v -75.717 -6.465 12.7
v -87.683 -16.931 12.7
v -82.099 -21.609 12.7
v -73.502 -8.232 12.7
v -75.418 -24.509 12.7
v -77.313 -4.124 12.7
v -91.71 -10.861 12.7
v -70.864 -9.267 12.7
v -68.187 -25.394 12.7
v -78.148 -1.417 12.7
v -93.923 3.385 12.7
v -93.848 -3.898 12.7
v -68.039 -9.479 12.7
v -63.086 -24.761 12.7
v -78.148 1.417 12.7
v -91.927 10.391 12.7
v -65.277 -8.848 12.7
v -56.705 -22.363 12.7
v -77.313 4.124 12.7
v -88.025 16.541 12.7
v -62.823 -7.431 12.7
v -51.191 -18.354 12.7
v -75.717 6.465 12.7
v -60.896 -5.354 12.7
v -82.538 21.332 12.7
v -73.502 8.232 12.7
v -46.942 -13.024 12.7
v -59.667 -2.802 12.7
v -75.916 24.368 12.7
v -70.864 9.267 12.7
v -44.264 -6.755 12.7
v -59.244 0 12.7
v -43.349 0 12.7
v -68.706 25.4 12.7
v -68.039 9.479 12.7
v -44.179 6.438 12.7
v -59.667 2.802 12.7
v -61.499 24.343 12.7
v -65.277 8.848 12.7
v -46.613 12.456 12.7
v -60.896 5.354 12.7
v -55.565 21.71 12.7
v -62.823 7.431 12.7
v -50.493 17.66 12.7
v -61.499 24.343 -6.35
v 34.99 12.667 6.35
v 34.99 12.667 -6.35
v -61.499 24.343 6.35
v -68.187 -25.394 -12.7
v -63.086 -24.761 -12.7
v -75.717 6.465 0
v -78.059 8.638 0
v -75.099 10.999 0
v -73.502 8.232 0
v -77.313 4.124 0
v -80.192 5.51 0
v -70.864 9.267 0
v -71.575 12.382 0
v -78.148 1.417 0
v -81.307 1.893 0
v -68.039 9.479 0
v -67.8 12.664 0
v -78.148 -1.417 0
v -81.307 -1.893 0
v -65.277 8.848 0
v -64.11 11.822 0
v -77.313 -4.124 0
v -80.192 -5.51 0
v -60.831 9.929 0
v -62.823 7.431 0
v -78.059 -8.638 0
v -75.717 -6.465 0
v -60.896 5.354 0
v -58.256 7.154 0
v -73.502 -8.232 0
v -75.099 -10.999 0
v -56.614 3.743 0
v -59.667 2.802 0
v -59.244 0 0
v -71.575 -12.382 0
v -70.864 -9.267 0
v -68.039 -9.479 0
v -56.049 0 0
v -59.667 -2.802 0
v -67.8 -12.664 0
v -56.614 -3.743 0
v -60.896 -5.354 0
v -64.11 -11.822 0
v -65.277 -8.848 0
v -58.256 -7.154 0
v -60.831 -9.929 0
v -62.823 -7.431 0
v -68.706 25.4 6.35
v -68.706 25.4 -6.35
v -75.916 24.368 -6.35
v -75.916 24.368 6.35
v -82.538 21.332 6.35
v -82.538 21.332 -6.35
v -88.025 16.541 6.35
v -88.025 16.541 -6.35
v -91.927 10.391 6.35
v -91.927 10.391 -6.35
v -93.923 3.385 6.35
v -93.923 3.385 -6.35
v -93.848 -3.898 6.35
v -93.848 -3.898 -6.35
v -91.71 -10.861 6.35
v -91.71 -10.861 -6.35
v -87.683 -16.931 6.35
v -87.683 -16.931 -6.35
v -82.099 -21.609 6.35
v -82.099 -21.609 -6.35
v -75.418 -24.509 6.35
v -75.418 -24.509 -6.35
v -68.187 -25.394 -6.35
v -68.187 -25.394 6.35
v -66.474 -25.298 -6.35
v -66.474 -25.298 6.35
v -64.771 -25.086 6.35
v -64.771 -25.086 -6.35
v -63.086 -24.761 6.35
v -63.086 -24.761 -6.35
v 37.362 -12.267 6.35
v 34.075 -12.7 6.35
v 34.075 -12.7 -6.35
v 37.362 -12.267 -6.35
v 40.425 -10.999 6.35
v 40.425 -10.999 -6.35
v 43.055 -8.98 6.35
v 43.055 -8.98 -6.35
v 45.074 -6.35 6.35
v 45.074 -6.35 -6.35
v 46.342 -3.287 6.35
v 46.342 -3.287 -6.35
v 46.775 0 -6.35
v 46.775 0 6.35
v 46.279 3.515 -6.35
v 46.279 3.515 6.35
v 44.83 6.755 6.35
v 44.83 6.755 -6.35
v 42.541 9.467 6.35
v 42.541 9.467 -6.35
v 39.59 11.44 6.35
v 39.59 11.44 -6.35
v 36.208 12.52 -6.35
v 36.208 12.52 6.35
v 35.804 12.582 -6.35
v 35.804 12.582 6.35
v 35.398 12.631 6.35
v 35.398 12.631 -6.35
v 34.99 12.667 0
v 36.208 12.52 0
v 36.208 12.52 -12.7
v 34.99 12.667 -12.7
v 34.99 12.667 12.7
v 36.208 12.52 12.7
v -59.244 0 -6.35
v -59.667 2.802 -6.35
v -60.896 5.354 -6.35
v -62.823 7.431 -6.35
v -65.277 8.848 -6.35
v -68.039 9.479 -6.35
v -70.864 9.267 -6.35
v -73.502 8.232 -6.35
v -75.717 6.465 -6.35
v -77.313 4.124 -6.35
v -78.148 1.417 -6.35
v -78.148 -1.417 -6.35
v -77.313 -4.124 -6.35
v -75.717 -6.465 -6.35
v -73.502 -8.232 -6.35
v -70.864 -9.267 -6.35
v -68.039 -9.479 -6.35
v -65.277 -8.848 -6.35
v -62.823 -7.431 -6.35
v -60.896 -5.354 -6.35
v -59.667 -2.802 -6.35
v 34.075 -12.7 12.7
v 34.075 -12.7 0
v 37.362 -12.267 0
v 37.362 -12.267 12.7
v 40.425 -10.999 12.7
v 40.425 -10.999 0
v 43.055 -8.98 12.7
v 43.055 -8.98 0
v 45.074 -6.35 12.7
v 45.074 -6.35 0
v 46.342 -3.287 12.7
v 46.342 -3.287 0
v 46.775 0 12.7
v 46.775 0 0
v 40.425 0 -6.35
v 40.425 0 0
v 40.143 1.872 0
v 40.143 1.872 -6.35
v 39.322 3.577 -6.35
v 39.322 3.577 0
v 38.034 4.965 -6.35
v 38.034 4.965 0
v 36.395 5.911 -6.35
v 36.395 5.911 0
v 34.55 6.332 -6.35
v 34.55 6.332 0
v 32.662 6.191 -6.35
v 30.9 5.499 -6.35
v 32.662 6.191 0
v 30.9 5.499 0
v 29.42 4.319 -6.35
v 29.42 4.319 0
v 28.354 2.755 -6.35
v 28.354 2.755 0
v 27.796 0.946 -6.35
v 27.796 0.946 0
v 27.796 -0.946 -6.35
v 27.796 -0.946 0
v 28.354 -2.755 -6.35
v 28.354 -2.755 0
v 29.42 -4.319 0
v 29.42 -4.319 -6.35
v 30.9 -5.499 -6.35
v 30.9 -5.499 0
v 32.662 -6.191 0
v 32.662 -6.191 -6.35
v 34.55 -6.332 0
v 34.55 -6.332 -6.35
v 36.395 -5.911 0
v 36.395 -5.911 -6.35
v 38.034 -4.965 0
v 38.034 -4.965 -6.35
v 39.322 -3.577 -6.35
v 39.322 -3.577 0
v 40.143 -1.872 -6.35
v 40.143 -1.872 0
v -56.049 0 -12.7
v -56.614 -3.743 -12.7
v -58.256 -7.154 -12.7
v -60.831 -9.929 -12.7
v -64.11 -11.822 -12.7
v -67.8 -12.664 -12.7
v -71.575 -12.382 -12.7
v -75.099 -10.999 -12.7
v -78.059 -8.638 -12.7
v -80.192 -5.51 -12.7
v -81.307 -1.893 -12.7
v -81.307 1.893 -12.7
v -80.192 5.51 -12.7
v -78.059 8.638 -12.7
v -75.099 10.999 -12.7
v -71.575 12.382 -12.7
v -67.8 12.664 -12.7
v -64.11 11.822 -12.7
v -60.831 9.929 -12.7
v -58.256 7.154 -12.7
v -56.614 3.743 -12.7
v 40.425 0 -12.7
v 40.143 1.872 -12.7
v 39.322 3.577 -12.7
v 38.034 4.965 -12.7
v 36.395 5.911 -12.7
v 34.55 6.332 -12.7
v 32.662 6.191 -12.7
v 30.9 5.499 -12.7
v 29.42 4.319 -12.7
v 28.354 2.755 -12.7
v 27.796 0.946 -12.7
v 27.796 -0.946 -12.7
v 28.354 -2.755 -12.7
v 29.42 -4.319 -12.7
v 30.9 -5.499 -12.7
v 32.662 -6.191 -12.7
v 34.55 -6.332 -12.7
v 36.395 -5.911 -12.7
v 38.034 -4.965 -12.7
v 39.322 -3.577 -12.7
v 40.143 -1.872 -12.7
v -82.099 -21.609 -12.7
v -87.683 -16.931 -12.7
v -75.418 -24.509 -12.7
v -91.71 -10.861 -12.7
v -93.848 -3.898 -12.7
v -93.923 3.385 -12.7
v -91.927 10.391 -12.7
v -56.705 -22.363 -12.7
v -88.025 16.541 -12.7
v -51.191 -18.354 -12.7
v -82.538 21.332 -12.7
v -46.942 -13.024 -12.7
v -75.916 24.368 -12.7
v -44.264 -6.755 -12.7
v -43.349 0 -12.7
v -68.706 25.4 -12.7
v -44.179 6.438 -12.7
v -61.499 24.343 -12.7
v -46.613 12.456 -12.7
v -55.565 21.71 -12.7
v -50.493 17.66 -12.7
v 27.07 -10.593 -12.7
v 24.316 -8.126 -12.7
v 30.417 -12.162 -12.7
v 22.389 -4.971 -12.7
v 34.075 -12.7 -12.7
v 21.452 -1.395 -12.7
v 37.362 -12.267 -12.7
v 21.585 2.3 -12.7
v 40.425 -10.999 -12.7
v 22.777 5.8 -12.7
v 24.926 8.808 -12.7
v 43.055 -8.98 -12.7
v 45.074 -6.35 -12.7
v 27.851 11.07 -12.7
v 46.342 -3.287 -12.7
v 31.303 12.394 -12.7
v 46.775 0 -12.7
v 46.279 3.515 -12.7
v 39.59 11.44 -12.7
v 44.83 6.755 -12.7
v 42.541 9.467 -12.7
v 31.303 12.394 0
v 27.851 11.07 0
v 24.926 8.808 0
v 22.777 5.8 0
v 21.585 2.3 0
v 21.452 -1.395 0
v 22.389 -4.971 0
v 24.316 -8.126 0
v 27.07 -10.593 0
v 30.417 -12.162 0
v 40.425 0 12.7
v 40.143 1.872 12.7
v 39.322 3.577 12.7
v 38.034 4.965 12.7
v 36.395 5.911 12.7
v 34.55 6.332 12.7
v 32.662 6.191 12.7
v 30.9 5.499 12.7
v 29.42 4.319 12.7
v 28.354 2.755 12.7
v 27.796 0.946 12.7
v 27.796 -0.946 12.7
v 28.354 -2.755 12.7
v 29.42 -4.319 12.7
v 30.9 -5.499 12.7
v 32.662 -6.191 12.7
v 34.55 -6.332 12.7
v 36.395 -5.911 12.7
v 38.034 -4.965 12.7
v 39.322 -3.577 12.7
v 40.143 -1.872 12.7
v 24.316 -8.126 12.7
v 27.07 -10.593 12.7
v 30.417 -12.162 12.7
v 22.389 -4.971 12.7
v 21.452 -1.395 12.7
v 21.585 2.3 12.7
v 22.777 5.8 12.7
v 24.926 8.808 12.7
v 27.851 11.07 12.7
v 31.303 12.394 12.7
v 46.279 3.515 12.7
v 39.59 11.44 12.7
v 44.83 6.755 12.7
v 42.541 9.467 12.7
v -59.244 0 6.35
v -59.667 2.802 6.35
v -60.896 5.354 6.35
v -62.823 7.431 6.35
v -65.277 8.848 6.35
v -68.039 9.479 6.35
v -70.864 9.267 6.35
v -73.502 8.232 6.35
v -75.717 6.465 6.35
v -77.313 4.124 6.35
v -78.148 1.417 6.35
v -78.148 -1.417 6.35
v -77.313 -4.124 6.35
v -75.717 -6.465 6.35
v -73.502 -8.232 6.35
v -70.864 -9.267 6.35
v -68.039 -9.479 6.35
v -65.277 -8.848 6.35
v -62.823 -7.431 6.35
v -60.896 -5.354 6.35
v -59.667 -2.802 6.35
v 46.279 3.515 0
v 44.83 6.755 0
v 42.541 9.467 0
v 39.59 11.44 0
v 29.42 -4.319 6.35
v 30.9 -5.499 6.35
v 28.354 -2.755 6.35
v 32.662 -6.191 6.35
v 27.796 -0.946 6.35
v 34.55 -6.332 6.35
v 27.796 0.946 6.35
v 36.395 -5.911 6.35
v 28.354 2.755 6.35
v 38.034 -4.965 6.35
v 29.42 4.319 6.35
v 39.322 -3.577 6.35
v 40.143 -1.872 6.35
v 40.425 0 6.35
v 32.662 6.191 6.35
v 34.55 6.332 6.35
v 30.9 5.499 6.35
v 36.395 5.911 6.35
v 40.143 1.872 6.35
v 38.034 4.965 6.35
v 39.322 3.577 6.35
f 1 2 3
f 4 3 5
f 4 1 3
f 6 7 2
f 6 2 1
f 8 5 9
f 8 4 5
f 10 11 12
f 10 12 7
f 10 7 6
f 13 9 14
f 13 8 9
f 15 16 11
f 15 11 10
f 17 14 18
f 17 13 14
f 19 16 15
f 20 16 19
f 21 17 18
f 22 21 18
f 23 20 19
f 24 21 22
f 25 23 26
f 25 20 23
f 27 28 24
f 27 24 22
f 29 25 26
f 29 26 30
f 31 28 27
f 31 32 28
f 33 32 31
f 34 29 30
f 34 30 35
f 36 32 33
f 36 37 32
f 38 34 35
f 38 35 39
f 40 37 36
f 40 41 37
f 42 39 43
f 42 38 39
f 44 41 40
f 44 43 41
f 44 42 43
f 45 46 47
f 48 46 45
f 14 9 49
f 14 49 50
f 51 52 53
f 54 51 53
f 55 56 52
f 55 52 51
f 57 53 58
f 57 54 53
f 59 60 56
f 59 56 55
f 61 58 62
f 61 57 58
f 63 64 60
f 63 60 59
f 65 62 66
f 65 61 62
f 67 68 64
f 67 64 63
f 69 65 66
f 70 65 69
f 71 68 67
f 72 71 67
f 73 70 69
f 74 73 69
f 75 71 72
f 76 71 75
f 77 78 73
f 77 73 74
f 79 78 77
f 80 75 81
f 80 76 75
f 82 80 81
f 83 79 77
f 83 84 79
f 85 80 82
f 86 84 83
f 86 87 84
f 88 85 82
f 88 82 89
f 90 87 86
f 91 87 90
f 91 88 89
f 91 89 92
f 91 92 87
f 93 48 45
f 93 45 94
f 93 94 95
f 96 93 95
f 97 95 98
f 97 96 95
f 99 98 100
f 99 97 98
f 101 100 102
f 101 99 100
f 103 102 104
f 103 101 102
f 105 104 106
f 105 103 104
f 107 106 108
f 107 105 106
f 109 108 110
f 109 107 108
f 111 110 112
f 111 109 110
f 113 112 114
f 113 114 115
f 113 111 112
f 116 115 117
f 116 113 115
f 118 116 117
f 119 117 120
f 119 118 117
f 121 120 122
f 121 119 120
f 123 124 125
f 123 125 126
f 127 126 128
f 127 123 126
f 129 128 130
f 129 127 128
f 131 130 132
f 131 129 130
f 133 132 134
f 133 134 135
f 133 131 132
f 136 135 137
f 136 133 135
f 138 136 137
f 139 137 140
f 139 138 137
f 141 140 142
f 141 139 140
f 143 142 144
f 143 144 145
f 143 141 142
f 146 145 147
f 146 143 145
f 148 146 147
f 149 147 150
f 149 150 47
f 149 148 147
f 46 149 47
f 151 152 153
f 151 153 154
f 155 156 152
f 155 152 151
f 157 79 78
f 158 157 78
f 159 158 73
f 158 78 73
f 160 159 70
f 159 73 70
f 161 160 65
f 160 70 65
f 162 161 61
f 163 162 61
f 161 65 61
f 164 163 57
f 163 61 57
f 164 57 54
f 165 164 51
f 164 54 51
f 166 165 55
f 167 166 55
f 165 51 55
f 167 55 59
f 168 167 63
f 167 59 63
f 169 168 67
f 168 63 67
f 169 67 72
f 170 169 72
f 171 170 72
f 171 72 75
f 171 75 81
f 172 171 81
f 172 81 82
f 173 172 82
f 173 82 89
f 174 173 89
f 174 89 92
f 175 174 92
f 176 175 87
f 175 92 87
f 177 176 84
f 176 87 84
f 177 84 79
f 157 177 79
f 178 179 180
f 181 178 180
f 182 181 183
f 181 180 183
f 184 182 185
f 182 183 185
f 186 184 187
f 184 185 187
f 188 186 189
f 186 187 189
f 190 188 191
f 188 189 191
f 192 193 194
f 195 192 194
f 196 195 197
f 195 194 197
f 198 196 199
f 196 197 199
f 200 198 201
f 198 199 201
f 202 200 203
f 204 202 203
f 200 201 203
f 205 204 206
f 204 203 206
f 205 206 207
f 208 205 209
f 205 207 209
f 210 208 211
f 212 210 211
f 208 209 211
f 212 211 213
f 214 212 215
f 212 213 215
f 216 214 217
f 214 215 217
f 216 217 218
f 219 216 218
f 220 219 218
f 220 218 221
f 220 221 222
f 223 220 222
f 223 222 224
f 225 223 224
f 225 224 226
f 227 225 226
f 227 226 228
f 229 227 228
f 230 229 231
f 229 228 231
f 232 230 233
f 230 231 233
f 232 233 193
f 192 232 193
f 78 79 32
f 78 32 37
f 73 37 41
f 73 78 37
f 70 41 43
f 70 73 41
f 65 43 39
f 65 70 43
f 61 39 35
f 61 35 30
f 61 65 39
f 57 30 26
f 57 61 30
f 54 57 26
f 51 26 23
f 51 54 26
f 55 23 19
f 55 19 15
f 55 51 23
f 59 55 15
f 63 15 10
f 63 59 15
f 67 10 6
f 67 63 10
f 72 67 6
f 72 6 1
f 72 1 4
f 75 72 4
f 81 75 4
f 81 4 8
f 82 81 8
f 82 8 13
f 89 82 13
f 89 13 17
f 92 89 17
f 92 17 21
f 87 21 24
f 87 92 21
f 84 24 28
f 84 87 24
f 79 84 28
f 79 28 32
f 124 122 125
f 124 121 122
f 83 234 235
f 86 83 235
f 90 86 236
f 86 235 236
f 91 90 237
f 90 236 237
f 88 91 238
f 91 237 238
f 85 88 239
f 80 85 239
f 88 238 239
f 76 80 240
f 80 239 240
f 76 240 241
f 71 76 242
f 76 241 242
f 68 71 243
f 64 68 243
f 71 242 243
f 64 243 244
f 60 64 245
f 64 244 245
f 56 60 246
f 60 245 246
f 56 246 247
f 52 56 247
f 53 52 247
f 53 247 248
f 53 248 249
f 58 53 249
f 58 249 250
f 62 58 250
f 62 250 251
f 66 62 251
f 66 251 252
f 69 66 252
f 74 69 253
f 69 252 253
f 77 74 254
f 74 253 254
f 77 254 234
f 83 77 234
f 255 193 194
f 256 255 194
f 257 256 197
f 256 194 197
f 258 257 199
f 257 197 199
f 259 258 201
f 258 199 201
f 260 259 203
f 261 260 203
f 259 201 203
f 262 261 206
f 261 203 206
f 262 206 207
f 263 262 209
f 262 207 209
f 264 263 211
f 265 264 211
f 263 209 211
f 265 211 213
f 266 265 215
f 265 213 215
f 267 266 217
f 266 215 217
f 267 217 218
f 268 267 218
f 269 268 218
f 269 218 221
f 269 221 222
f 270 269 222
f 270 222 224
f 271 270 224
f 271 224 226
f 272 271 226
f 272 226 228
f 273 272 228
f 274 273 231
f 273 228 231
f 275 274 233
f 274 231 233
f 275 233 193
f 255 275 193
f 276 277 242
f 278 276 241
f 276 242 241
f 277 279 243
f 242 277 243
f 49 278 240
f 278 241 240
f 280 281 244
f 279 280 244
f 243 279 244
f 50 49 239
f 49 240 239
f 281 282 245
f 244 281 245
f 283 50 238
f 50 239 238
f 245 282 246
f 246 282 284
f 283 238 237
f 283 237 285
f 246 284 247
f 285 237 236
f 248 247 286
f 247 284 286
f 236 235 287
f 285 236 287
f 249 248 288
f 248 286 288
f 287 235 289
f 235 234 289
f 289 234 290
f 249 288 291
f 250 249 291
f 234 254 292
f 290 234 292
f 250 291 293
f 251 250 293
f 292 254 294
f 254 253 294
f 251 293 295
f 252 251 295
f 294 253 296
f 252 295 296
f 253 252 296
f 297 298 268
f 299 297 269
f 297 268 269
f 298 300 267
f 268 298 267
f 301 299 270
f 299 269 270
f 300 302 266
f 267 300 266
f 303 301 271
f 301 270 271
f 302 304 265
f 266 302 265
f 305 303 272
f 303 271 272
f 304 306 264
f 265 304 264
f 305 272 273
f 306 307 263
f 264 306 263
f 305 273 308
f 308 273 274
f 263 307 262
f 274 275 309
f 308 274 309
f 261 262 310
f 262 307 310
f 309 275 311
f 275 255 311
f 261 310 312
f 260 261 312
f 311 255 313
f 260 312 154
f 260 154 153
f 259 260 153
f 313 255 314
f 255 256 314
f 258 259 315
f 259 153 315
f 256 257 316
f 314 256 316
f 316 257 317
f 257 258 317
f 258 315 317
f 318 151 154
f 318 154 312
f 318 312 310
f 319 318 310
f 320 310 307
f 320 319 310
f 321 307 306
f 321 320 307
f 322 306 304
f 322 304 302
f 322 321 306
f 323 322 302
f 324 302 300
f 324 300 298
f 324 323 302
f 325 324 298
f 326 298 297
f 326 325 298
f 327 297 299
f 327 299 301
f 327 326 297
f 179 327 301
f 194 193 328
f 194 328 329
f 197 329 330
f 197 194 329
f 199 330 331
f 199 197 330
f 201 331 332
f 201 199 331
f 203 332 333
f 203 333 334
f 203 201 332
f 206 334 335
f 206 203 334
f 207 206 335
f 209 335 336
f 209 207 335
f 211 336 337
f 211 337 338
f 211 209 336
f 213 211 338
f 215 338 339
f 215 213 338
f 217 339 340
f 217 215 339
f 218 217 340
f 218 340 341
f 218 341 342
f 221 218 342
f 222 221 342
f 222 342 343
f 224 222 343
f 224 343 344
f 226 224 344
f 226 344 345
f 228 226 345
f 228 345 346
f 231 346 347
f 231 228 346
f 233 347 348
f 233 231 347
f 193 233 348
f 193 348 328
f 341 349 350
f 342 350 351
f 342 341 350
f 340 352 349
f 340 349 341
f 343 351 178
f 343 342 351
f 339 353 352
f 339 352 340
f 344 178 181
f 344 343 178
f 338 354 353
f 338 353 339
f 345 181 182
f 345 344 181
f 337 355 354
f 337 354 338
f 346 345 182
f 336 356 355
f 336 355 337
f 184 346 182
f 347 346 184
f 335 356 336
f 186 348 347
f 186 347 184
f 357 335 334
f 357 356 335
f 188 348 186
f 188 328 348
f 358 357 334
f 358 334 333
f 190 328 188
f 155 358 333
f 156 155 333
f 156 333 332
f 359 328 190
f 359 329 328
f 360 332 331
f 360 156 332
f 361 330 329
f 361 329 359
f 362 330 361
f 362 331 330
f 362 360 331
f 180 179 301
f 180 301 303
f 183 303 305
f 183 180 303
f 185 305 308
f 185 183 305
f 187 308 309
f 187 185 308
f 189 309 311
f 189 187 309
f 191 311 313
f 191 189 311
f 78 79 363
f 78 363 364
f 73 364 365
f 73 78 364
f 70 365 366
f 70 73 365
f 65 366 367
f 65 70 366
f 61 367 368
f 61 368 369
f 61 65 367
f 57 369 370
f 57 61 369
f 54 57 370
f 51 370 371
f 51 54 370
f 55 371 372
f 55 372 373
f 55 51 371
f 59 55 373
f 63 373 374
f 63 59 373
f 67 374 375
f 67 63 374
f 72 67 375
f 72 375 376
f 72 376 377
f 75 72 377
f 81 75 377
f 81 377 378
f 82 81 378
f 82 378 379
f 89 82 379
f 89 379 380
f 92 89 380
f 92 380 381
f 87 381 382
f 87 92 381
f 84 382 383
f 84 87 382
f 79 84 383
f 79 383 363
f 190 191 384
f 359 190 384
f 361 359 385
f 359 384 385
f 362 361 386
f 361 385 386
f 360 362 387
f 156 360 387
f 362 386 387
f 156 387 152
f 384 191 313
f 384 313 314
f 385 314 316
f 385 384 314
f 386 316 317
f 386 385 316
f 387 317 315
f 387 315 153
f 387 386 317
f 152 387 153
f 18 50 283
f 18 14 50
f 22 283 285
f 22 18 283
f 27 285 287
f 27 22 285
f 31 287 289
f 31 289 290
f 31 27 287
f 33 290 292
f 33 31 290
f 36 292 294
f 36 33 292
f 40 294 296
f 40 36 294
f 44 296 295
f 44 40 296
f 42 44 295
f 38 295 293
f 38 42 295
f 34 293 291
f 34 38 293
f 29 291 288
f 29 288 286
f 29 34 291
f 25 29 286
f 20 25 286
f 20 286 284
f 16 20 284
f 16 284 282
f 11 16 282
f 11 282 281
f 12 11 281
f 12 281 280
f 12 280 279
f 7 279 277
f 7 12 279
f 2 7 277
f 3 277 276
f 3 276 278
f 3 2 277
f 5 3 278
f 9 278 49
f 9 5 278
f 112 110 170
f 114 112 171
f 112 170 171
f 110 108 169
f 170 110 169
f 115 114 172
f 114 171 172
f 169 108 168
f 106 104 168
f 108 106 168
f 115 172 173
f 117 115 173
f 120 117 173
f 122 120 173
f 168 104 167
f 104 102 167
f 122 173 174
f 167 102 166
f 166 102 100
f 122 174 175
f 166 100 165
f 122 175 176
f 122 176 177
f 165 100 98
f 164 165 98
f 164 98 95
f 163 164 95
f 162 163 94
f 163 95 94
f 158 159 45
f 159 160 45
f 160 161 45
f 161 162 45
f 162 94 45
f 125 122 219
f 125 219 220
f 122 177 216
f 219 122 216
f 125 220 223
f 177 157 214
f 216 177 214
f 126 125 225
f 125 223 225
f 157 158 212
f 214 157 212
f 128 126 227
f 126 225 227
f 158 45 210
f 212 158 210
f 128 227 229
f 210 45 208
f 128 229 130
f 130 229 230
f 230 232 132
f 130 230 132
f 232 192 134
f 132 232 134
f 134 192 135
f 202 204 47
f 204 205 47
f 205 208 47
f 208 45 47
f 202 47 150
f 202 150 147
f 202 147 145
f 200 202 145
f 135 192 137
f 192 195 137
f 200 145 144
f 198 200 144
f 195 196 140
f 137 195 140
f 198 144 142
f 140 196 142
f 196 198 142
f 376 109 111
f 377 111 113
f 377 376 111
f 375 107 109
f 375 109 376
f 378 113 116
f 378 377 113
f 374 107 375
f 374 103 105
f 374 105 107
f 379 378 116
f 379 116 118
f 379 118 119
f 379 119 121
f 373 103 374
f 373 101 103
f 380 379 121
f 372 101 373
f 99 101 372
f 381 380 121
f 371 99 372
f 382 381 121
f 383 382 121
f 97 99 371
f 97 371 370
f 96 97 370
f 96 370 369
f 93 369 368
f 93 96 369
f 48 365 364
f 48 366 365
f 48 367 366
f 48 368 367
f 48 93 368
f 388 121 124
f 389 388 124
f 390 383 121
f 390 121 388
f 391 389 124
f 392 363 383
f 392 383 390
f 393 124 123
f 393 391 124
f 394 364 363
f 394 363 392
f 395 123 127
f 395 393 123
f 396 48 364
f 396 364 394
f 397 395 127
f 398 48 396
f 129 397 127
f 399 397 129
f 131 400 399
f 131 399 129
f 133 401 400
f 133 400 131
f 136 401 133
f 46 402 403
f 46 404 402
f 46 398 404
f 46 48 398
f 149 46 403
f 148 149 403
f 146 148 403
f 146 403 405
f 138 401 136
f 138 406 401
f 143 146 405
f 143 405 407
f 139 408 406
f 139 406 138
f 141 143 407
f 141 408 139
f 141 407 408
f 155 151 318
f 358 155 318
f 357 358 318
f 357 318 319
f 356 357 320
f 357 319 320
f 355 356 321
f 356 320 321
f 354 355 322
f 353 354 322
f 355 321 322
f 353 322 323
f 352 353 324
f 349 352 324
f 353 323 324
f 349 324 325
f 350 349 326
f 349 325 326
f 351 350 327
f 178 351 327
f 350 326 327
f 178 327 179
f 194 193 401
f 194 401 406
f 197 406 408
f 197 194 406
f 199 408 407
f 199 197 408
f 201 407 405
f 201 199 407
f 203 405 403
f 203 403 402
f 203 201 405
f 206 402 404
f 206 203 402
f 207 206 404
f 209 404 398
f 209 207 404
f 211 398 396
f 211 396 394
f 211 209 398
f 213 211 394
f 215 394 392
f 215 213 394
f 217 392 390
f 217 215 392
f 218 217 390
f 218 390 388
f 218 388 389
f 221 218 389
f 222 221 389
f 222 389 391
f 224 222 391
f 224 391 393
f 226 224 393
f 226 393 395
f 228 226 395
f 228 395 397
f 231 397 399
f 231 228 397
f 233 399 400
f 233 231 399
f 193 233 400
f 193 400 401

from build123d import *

# Parameters (mm, degrees)
F0_R          = 9.5051197762
F1_DEPTH      = 12.7
F1_DEPTH_BACK = 12.7
F0_R_2        = 6.35
F2_DEPTH      = 6.35
F2_DEPTH_BACK = 6.35
F3_R          = 12.7
F4_DEPTH      = 12.7


with BuildPart() as f1:
    # F0 (on Top) → F1 (new body, two sides)
    with BuildSketch(Plane.XY) as f1_sk:
        with BuildLine():
            ThreePointArc((-63.0856611977, -24.7605061219), (-48.8871011462, -15.8319673643), (-43.3493469753, 0))
            ThreePointArc((-43.3493469753, 0), (-48.3861185924, 15.1821912064), (-61.498869009, 24.3431832196))
            ThreePointArc((-61.498869009, 24.3431832196), (-93.9227433709, 3.3852789998), (-68.187418541, -25.393783421))
            Line((-68.187418541, -25.393783421), (-63.0856611977, -24.7605061219))
        make_face()
        with Locations((-68.7493469753, 0)):
            Circle(F0_R, mode=Mode.SUBTRACT)
    extrude(amount=F1_DEPTH)
    extrude(f1_sk.sketch, amount=-F1_DEPTH_BACK)

    # F3 (on face) → F4 (cut)
    with BuildSketch(Plane(origin=(0, 0, -12.7), x_dir=(1, 0, 0), z_dir=(0, 0, -1))):
        with Locations((-68.7493469753, 0)):
            Circle(F3_R)
    extrude(amount=-F4_DEPTH, mode=Mode.SUBTRACT)


with BuildPart() as f1b:
    # F0 (on Top) → F1, piece 2 (new body, two sides)
    with BuildSketch(Plane.XY) as f1_2_sk:
        with BuildLine():
            Line((36.2084881778, 12.5195501056), (34.9897814236, 12.6670266309))
            ThreePointArc((34.9897814236, 12.6670266309), (21.383458511, 0.4575815704), (34.0752124917, -12.7))
            ThreePointArc((34.0752124917, -12.7), (43.0554686128, -8.9802561211), (46.7752124917, 0))
            ThreePointArc((46.7752124917, 0), (43.7804327678, 8.1913795782), (36.2084881778, 12.5195501056))
        make_face()
        with Locations((34.0752124917, 0)):
            Circle(F0_R_2, mode=Mode.SUBTRACT)
    extrude(amount=F1_DEPTH)
    extrude(f1_2_sk.sketch, amount=-F1_DEPTH_BACK)


with BuildPart() as f2:
    # F0 (on Top) → F2 (new body, two sides)
    with BuildSketch(Plane.XY) as f2_sk:
        with BuildLine():
            ThreePointArc((-63.0856611977, -24.7605061219), (-48.8871011462, -15.8319673643), (-43.3493469753, 0))
            ThreePointArc((-43.3493469753, 0), (-48.3861185924, 15.1821912064), (-61.498869009, 24.3431832196))
            ThreePointArc((-61.498869009, 24.3431832196), (-93.9227433709, 3.3852789998), (-68.187418541, -25.393783421))
            Line((-68.187418541, -25.393783421), (-63.0856611977, -24.7605061219))
        make_face()
        with Locations((-68.7493469753, 0)):
            Circle(F0_R, mode=Mode.SUBTRACT)
        with BuildLine():
            ThreePointArc((-61.498869009, 24.3431832196), (-48.3861185924, 15.1821912064), (-43.3493469753, 0))
            ThreePointArc((-43.3493469753, 0), (-48.8871011462, -15.8319673643), (-63.0856611977, -24.7605061219))
            Line((-63.0856611977, -24.7605061219), (34.0752124917, -12.7))
            ThreePointArc((34.0752124917, -12.7), (21.383458511, 0.4575815704), (34.9897814236, 12.6670266309))
            Line((34.9897814236, 12.6670266309), (-61.498869009, 24.3431832196))
        make_face()
        with BuildLine():
            ThreePointArc((-68.187418541, -25.393783421), (-65.6204768736, -25.2065501782), (-63.0856611977, -24.7605061219))
            Line((-63.0856611977, -24.7605061219), (-68.187418541, -25.393783421))
        make_face()
        with BuildLine():
            Line((36.2084881778, 12.5195501056), (34.9897814236, 12.6670266309))
            ThreePointArc((34.9897814236, 12.6670266309), (21.383458511, 0.4575815704), (34.0752124917, -12.7))
            ThreePointArc((34.0752124917, -12.7), (43.0554686128, -8.9802561211), (46.7752124917, 0))
            ThreePointArc((46.7752124917, 0), (43.7804327678, 8.1913795782), (36.2084881778, 12.5195501056))
        make_face()
        with Locations((34.0752124917, 0)):
            Circle(F0_R_2, mode=Mode.SUBTRACT)
        with BuildLine():
            ThreePointArc((36.2084881778, 12.5195501056), (35.60091775, 12.6080221869), (34.9897814236, 12.6670266309))
            Line((34.9897814236, 12.6670266309), (36.2084881778, 12.5195501056))
        make_face()
    extrude(amount=F2_DEPTH)
    extrude(f2_sk.sketch, amount=-F2_DEPTH_BACK)


solid = Compound([f1.part, f1b.part, f2.part])
